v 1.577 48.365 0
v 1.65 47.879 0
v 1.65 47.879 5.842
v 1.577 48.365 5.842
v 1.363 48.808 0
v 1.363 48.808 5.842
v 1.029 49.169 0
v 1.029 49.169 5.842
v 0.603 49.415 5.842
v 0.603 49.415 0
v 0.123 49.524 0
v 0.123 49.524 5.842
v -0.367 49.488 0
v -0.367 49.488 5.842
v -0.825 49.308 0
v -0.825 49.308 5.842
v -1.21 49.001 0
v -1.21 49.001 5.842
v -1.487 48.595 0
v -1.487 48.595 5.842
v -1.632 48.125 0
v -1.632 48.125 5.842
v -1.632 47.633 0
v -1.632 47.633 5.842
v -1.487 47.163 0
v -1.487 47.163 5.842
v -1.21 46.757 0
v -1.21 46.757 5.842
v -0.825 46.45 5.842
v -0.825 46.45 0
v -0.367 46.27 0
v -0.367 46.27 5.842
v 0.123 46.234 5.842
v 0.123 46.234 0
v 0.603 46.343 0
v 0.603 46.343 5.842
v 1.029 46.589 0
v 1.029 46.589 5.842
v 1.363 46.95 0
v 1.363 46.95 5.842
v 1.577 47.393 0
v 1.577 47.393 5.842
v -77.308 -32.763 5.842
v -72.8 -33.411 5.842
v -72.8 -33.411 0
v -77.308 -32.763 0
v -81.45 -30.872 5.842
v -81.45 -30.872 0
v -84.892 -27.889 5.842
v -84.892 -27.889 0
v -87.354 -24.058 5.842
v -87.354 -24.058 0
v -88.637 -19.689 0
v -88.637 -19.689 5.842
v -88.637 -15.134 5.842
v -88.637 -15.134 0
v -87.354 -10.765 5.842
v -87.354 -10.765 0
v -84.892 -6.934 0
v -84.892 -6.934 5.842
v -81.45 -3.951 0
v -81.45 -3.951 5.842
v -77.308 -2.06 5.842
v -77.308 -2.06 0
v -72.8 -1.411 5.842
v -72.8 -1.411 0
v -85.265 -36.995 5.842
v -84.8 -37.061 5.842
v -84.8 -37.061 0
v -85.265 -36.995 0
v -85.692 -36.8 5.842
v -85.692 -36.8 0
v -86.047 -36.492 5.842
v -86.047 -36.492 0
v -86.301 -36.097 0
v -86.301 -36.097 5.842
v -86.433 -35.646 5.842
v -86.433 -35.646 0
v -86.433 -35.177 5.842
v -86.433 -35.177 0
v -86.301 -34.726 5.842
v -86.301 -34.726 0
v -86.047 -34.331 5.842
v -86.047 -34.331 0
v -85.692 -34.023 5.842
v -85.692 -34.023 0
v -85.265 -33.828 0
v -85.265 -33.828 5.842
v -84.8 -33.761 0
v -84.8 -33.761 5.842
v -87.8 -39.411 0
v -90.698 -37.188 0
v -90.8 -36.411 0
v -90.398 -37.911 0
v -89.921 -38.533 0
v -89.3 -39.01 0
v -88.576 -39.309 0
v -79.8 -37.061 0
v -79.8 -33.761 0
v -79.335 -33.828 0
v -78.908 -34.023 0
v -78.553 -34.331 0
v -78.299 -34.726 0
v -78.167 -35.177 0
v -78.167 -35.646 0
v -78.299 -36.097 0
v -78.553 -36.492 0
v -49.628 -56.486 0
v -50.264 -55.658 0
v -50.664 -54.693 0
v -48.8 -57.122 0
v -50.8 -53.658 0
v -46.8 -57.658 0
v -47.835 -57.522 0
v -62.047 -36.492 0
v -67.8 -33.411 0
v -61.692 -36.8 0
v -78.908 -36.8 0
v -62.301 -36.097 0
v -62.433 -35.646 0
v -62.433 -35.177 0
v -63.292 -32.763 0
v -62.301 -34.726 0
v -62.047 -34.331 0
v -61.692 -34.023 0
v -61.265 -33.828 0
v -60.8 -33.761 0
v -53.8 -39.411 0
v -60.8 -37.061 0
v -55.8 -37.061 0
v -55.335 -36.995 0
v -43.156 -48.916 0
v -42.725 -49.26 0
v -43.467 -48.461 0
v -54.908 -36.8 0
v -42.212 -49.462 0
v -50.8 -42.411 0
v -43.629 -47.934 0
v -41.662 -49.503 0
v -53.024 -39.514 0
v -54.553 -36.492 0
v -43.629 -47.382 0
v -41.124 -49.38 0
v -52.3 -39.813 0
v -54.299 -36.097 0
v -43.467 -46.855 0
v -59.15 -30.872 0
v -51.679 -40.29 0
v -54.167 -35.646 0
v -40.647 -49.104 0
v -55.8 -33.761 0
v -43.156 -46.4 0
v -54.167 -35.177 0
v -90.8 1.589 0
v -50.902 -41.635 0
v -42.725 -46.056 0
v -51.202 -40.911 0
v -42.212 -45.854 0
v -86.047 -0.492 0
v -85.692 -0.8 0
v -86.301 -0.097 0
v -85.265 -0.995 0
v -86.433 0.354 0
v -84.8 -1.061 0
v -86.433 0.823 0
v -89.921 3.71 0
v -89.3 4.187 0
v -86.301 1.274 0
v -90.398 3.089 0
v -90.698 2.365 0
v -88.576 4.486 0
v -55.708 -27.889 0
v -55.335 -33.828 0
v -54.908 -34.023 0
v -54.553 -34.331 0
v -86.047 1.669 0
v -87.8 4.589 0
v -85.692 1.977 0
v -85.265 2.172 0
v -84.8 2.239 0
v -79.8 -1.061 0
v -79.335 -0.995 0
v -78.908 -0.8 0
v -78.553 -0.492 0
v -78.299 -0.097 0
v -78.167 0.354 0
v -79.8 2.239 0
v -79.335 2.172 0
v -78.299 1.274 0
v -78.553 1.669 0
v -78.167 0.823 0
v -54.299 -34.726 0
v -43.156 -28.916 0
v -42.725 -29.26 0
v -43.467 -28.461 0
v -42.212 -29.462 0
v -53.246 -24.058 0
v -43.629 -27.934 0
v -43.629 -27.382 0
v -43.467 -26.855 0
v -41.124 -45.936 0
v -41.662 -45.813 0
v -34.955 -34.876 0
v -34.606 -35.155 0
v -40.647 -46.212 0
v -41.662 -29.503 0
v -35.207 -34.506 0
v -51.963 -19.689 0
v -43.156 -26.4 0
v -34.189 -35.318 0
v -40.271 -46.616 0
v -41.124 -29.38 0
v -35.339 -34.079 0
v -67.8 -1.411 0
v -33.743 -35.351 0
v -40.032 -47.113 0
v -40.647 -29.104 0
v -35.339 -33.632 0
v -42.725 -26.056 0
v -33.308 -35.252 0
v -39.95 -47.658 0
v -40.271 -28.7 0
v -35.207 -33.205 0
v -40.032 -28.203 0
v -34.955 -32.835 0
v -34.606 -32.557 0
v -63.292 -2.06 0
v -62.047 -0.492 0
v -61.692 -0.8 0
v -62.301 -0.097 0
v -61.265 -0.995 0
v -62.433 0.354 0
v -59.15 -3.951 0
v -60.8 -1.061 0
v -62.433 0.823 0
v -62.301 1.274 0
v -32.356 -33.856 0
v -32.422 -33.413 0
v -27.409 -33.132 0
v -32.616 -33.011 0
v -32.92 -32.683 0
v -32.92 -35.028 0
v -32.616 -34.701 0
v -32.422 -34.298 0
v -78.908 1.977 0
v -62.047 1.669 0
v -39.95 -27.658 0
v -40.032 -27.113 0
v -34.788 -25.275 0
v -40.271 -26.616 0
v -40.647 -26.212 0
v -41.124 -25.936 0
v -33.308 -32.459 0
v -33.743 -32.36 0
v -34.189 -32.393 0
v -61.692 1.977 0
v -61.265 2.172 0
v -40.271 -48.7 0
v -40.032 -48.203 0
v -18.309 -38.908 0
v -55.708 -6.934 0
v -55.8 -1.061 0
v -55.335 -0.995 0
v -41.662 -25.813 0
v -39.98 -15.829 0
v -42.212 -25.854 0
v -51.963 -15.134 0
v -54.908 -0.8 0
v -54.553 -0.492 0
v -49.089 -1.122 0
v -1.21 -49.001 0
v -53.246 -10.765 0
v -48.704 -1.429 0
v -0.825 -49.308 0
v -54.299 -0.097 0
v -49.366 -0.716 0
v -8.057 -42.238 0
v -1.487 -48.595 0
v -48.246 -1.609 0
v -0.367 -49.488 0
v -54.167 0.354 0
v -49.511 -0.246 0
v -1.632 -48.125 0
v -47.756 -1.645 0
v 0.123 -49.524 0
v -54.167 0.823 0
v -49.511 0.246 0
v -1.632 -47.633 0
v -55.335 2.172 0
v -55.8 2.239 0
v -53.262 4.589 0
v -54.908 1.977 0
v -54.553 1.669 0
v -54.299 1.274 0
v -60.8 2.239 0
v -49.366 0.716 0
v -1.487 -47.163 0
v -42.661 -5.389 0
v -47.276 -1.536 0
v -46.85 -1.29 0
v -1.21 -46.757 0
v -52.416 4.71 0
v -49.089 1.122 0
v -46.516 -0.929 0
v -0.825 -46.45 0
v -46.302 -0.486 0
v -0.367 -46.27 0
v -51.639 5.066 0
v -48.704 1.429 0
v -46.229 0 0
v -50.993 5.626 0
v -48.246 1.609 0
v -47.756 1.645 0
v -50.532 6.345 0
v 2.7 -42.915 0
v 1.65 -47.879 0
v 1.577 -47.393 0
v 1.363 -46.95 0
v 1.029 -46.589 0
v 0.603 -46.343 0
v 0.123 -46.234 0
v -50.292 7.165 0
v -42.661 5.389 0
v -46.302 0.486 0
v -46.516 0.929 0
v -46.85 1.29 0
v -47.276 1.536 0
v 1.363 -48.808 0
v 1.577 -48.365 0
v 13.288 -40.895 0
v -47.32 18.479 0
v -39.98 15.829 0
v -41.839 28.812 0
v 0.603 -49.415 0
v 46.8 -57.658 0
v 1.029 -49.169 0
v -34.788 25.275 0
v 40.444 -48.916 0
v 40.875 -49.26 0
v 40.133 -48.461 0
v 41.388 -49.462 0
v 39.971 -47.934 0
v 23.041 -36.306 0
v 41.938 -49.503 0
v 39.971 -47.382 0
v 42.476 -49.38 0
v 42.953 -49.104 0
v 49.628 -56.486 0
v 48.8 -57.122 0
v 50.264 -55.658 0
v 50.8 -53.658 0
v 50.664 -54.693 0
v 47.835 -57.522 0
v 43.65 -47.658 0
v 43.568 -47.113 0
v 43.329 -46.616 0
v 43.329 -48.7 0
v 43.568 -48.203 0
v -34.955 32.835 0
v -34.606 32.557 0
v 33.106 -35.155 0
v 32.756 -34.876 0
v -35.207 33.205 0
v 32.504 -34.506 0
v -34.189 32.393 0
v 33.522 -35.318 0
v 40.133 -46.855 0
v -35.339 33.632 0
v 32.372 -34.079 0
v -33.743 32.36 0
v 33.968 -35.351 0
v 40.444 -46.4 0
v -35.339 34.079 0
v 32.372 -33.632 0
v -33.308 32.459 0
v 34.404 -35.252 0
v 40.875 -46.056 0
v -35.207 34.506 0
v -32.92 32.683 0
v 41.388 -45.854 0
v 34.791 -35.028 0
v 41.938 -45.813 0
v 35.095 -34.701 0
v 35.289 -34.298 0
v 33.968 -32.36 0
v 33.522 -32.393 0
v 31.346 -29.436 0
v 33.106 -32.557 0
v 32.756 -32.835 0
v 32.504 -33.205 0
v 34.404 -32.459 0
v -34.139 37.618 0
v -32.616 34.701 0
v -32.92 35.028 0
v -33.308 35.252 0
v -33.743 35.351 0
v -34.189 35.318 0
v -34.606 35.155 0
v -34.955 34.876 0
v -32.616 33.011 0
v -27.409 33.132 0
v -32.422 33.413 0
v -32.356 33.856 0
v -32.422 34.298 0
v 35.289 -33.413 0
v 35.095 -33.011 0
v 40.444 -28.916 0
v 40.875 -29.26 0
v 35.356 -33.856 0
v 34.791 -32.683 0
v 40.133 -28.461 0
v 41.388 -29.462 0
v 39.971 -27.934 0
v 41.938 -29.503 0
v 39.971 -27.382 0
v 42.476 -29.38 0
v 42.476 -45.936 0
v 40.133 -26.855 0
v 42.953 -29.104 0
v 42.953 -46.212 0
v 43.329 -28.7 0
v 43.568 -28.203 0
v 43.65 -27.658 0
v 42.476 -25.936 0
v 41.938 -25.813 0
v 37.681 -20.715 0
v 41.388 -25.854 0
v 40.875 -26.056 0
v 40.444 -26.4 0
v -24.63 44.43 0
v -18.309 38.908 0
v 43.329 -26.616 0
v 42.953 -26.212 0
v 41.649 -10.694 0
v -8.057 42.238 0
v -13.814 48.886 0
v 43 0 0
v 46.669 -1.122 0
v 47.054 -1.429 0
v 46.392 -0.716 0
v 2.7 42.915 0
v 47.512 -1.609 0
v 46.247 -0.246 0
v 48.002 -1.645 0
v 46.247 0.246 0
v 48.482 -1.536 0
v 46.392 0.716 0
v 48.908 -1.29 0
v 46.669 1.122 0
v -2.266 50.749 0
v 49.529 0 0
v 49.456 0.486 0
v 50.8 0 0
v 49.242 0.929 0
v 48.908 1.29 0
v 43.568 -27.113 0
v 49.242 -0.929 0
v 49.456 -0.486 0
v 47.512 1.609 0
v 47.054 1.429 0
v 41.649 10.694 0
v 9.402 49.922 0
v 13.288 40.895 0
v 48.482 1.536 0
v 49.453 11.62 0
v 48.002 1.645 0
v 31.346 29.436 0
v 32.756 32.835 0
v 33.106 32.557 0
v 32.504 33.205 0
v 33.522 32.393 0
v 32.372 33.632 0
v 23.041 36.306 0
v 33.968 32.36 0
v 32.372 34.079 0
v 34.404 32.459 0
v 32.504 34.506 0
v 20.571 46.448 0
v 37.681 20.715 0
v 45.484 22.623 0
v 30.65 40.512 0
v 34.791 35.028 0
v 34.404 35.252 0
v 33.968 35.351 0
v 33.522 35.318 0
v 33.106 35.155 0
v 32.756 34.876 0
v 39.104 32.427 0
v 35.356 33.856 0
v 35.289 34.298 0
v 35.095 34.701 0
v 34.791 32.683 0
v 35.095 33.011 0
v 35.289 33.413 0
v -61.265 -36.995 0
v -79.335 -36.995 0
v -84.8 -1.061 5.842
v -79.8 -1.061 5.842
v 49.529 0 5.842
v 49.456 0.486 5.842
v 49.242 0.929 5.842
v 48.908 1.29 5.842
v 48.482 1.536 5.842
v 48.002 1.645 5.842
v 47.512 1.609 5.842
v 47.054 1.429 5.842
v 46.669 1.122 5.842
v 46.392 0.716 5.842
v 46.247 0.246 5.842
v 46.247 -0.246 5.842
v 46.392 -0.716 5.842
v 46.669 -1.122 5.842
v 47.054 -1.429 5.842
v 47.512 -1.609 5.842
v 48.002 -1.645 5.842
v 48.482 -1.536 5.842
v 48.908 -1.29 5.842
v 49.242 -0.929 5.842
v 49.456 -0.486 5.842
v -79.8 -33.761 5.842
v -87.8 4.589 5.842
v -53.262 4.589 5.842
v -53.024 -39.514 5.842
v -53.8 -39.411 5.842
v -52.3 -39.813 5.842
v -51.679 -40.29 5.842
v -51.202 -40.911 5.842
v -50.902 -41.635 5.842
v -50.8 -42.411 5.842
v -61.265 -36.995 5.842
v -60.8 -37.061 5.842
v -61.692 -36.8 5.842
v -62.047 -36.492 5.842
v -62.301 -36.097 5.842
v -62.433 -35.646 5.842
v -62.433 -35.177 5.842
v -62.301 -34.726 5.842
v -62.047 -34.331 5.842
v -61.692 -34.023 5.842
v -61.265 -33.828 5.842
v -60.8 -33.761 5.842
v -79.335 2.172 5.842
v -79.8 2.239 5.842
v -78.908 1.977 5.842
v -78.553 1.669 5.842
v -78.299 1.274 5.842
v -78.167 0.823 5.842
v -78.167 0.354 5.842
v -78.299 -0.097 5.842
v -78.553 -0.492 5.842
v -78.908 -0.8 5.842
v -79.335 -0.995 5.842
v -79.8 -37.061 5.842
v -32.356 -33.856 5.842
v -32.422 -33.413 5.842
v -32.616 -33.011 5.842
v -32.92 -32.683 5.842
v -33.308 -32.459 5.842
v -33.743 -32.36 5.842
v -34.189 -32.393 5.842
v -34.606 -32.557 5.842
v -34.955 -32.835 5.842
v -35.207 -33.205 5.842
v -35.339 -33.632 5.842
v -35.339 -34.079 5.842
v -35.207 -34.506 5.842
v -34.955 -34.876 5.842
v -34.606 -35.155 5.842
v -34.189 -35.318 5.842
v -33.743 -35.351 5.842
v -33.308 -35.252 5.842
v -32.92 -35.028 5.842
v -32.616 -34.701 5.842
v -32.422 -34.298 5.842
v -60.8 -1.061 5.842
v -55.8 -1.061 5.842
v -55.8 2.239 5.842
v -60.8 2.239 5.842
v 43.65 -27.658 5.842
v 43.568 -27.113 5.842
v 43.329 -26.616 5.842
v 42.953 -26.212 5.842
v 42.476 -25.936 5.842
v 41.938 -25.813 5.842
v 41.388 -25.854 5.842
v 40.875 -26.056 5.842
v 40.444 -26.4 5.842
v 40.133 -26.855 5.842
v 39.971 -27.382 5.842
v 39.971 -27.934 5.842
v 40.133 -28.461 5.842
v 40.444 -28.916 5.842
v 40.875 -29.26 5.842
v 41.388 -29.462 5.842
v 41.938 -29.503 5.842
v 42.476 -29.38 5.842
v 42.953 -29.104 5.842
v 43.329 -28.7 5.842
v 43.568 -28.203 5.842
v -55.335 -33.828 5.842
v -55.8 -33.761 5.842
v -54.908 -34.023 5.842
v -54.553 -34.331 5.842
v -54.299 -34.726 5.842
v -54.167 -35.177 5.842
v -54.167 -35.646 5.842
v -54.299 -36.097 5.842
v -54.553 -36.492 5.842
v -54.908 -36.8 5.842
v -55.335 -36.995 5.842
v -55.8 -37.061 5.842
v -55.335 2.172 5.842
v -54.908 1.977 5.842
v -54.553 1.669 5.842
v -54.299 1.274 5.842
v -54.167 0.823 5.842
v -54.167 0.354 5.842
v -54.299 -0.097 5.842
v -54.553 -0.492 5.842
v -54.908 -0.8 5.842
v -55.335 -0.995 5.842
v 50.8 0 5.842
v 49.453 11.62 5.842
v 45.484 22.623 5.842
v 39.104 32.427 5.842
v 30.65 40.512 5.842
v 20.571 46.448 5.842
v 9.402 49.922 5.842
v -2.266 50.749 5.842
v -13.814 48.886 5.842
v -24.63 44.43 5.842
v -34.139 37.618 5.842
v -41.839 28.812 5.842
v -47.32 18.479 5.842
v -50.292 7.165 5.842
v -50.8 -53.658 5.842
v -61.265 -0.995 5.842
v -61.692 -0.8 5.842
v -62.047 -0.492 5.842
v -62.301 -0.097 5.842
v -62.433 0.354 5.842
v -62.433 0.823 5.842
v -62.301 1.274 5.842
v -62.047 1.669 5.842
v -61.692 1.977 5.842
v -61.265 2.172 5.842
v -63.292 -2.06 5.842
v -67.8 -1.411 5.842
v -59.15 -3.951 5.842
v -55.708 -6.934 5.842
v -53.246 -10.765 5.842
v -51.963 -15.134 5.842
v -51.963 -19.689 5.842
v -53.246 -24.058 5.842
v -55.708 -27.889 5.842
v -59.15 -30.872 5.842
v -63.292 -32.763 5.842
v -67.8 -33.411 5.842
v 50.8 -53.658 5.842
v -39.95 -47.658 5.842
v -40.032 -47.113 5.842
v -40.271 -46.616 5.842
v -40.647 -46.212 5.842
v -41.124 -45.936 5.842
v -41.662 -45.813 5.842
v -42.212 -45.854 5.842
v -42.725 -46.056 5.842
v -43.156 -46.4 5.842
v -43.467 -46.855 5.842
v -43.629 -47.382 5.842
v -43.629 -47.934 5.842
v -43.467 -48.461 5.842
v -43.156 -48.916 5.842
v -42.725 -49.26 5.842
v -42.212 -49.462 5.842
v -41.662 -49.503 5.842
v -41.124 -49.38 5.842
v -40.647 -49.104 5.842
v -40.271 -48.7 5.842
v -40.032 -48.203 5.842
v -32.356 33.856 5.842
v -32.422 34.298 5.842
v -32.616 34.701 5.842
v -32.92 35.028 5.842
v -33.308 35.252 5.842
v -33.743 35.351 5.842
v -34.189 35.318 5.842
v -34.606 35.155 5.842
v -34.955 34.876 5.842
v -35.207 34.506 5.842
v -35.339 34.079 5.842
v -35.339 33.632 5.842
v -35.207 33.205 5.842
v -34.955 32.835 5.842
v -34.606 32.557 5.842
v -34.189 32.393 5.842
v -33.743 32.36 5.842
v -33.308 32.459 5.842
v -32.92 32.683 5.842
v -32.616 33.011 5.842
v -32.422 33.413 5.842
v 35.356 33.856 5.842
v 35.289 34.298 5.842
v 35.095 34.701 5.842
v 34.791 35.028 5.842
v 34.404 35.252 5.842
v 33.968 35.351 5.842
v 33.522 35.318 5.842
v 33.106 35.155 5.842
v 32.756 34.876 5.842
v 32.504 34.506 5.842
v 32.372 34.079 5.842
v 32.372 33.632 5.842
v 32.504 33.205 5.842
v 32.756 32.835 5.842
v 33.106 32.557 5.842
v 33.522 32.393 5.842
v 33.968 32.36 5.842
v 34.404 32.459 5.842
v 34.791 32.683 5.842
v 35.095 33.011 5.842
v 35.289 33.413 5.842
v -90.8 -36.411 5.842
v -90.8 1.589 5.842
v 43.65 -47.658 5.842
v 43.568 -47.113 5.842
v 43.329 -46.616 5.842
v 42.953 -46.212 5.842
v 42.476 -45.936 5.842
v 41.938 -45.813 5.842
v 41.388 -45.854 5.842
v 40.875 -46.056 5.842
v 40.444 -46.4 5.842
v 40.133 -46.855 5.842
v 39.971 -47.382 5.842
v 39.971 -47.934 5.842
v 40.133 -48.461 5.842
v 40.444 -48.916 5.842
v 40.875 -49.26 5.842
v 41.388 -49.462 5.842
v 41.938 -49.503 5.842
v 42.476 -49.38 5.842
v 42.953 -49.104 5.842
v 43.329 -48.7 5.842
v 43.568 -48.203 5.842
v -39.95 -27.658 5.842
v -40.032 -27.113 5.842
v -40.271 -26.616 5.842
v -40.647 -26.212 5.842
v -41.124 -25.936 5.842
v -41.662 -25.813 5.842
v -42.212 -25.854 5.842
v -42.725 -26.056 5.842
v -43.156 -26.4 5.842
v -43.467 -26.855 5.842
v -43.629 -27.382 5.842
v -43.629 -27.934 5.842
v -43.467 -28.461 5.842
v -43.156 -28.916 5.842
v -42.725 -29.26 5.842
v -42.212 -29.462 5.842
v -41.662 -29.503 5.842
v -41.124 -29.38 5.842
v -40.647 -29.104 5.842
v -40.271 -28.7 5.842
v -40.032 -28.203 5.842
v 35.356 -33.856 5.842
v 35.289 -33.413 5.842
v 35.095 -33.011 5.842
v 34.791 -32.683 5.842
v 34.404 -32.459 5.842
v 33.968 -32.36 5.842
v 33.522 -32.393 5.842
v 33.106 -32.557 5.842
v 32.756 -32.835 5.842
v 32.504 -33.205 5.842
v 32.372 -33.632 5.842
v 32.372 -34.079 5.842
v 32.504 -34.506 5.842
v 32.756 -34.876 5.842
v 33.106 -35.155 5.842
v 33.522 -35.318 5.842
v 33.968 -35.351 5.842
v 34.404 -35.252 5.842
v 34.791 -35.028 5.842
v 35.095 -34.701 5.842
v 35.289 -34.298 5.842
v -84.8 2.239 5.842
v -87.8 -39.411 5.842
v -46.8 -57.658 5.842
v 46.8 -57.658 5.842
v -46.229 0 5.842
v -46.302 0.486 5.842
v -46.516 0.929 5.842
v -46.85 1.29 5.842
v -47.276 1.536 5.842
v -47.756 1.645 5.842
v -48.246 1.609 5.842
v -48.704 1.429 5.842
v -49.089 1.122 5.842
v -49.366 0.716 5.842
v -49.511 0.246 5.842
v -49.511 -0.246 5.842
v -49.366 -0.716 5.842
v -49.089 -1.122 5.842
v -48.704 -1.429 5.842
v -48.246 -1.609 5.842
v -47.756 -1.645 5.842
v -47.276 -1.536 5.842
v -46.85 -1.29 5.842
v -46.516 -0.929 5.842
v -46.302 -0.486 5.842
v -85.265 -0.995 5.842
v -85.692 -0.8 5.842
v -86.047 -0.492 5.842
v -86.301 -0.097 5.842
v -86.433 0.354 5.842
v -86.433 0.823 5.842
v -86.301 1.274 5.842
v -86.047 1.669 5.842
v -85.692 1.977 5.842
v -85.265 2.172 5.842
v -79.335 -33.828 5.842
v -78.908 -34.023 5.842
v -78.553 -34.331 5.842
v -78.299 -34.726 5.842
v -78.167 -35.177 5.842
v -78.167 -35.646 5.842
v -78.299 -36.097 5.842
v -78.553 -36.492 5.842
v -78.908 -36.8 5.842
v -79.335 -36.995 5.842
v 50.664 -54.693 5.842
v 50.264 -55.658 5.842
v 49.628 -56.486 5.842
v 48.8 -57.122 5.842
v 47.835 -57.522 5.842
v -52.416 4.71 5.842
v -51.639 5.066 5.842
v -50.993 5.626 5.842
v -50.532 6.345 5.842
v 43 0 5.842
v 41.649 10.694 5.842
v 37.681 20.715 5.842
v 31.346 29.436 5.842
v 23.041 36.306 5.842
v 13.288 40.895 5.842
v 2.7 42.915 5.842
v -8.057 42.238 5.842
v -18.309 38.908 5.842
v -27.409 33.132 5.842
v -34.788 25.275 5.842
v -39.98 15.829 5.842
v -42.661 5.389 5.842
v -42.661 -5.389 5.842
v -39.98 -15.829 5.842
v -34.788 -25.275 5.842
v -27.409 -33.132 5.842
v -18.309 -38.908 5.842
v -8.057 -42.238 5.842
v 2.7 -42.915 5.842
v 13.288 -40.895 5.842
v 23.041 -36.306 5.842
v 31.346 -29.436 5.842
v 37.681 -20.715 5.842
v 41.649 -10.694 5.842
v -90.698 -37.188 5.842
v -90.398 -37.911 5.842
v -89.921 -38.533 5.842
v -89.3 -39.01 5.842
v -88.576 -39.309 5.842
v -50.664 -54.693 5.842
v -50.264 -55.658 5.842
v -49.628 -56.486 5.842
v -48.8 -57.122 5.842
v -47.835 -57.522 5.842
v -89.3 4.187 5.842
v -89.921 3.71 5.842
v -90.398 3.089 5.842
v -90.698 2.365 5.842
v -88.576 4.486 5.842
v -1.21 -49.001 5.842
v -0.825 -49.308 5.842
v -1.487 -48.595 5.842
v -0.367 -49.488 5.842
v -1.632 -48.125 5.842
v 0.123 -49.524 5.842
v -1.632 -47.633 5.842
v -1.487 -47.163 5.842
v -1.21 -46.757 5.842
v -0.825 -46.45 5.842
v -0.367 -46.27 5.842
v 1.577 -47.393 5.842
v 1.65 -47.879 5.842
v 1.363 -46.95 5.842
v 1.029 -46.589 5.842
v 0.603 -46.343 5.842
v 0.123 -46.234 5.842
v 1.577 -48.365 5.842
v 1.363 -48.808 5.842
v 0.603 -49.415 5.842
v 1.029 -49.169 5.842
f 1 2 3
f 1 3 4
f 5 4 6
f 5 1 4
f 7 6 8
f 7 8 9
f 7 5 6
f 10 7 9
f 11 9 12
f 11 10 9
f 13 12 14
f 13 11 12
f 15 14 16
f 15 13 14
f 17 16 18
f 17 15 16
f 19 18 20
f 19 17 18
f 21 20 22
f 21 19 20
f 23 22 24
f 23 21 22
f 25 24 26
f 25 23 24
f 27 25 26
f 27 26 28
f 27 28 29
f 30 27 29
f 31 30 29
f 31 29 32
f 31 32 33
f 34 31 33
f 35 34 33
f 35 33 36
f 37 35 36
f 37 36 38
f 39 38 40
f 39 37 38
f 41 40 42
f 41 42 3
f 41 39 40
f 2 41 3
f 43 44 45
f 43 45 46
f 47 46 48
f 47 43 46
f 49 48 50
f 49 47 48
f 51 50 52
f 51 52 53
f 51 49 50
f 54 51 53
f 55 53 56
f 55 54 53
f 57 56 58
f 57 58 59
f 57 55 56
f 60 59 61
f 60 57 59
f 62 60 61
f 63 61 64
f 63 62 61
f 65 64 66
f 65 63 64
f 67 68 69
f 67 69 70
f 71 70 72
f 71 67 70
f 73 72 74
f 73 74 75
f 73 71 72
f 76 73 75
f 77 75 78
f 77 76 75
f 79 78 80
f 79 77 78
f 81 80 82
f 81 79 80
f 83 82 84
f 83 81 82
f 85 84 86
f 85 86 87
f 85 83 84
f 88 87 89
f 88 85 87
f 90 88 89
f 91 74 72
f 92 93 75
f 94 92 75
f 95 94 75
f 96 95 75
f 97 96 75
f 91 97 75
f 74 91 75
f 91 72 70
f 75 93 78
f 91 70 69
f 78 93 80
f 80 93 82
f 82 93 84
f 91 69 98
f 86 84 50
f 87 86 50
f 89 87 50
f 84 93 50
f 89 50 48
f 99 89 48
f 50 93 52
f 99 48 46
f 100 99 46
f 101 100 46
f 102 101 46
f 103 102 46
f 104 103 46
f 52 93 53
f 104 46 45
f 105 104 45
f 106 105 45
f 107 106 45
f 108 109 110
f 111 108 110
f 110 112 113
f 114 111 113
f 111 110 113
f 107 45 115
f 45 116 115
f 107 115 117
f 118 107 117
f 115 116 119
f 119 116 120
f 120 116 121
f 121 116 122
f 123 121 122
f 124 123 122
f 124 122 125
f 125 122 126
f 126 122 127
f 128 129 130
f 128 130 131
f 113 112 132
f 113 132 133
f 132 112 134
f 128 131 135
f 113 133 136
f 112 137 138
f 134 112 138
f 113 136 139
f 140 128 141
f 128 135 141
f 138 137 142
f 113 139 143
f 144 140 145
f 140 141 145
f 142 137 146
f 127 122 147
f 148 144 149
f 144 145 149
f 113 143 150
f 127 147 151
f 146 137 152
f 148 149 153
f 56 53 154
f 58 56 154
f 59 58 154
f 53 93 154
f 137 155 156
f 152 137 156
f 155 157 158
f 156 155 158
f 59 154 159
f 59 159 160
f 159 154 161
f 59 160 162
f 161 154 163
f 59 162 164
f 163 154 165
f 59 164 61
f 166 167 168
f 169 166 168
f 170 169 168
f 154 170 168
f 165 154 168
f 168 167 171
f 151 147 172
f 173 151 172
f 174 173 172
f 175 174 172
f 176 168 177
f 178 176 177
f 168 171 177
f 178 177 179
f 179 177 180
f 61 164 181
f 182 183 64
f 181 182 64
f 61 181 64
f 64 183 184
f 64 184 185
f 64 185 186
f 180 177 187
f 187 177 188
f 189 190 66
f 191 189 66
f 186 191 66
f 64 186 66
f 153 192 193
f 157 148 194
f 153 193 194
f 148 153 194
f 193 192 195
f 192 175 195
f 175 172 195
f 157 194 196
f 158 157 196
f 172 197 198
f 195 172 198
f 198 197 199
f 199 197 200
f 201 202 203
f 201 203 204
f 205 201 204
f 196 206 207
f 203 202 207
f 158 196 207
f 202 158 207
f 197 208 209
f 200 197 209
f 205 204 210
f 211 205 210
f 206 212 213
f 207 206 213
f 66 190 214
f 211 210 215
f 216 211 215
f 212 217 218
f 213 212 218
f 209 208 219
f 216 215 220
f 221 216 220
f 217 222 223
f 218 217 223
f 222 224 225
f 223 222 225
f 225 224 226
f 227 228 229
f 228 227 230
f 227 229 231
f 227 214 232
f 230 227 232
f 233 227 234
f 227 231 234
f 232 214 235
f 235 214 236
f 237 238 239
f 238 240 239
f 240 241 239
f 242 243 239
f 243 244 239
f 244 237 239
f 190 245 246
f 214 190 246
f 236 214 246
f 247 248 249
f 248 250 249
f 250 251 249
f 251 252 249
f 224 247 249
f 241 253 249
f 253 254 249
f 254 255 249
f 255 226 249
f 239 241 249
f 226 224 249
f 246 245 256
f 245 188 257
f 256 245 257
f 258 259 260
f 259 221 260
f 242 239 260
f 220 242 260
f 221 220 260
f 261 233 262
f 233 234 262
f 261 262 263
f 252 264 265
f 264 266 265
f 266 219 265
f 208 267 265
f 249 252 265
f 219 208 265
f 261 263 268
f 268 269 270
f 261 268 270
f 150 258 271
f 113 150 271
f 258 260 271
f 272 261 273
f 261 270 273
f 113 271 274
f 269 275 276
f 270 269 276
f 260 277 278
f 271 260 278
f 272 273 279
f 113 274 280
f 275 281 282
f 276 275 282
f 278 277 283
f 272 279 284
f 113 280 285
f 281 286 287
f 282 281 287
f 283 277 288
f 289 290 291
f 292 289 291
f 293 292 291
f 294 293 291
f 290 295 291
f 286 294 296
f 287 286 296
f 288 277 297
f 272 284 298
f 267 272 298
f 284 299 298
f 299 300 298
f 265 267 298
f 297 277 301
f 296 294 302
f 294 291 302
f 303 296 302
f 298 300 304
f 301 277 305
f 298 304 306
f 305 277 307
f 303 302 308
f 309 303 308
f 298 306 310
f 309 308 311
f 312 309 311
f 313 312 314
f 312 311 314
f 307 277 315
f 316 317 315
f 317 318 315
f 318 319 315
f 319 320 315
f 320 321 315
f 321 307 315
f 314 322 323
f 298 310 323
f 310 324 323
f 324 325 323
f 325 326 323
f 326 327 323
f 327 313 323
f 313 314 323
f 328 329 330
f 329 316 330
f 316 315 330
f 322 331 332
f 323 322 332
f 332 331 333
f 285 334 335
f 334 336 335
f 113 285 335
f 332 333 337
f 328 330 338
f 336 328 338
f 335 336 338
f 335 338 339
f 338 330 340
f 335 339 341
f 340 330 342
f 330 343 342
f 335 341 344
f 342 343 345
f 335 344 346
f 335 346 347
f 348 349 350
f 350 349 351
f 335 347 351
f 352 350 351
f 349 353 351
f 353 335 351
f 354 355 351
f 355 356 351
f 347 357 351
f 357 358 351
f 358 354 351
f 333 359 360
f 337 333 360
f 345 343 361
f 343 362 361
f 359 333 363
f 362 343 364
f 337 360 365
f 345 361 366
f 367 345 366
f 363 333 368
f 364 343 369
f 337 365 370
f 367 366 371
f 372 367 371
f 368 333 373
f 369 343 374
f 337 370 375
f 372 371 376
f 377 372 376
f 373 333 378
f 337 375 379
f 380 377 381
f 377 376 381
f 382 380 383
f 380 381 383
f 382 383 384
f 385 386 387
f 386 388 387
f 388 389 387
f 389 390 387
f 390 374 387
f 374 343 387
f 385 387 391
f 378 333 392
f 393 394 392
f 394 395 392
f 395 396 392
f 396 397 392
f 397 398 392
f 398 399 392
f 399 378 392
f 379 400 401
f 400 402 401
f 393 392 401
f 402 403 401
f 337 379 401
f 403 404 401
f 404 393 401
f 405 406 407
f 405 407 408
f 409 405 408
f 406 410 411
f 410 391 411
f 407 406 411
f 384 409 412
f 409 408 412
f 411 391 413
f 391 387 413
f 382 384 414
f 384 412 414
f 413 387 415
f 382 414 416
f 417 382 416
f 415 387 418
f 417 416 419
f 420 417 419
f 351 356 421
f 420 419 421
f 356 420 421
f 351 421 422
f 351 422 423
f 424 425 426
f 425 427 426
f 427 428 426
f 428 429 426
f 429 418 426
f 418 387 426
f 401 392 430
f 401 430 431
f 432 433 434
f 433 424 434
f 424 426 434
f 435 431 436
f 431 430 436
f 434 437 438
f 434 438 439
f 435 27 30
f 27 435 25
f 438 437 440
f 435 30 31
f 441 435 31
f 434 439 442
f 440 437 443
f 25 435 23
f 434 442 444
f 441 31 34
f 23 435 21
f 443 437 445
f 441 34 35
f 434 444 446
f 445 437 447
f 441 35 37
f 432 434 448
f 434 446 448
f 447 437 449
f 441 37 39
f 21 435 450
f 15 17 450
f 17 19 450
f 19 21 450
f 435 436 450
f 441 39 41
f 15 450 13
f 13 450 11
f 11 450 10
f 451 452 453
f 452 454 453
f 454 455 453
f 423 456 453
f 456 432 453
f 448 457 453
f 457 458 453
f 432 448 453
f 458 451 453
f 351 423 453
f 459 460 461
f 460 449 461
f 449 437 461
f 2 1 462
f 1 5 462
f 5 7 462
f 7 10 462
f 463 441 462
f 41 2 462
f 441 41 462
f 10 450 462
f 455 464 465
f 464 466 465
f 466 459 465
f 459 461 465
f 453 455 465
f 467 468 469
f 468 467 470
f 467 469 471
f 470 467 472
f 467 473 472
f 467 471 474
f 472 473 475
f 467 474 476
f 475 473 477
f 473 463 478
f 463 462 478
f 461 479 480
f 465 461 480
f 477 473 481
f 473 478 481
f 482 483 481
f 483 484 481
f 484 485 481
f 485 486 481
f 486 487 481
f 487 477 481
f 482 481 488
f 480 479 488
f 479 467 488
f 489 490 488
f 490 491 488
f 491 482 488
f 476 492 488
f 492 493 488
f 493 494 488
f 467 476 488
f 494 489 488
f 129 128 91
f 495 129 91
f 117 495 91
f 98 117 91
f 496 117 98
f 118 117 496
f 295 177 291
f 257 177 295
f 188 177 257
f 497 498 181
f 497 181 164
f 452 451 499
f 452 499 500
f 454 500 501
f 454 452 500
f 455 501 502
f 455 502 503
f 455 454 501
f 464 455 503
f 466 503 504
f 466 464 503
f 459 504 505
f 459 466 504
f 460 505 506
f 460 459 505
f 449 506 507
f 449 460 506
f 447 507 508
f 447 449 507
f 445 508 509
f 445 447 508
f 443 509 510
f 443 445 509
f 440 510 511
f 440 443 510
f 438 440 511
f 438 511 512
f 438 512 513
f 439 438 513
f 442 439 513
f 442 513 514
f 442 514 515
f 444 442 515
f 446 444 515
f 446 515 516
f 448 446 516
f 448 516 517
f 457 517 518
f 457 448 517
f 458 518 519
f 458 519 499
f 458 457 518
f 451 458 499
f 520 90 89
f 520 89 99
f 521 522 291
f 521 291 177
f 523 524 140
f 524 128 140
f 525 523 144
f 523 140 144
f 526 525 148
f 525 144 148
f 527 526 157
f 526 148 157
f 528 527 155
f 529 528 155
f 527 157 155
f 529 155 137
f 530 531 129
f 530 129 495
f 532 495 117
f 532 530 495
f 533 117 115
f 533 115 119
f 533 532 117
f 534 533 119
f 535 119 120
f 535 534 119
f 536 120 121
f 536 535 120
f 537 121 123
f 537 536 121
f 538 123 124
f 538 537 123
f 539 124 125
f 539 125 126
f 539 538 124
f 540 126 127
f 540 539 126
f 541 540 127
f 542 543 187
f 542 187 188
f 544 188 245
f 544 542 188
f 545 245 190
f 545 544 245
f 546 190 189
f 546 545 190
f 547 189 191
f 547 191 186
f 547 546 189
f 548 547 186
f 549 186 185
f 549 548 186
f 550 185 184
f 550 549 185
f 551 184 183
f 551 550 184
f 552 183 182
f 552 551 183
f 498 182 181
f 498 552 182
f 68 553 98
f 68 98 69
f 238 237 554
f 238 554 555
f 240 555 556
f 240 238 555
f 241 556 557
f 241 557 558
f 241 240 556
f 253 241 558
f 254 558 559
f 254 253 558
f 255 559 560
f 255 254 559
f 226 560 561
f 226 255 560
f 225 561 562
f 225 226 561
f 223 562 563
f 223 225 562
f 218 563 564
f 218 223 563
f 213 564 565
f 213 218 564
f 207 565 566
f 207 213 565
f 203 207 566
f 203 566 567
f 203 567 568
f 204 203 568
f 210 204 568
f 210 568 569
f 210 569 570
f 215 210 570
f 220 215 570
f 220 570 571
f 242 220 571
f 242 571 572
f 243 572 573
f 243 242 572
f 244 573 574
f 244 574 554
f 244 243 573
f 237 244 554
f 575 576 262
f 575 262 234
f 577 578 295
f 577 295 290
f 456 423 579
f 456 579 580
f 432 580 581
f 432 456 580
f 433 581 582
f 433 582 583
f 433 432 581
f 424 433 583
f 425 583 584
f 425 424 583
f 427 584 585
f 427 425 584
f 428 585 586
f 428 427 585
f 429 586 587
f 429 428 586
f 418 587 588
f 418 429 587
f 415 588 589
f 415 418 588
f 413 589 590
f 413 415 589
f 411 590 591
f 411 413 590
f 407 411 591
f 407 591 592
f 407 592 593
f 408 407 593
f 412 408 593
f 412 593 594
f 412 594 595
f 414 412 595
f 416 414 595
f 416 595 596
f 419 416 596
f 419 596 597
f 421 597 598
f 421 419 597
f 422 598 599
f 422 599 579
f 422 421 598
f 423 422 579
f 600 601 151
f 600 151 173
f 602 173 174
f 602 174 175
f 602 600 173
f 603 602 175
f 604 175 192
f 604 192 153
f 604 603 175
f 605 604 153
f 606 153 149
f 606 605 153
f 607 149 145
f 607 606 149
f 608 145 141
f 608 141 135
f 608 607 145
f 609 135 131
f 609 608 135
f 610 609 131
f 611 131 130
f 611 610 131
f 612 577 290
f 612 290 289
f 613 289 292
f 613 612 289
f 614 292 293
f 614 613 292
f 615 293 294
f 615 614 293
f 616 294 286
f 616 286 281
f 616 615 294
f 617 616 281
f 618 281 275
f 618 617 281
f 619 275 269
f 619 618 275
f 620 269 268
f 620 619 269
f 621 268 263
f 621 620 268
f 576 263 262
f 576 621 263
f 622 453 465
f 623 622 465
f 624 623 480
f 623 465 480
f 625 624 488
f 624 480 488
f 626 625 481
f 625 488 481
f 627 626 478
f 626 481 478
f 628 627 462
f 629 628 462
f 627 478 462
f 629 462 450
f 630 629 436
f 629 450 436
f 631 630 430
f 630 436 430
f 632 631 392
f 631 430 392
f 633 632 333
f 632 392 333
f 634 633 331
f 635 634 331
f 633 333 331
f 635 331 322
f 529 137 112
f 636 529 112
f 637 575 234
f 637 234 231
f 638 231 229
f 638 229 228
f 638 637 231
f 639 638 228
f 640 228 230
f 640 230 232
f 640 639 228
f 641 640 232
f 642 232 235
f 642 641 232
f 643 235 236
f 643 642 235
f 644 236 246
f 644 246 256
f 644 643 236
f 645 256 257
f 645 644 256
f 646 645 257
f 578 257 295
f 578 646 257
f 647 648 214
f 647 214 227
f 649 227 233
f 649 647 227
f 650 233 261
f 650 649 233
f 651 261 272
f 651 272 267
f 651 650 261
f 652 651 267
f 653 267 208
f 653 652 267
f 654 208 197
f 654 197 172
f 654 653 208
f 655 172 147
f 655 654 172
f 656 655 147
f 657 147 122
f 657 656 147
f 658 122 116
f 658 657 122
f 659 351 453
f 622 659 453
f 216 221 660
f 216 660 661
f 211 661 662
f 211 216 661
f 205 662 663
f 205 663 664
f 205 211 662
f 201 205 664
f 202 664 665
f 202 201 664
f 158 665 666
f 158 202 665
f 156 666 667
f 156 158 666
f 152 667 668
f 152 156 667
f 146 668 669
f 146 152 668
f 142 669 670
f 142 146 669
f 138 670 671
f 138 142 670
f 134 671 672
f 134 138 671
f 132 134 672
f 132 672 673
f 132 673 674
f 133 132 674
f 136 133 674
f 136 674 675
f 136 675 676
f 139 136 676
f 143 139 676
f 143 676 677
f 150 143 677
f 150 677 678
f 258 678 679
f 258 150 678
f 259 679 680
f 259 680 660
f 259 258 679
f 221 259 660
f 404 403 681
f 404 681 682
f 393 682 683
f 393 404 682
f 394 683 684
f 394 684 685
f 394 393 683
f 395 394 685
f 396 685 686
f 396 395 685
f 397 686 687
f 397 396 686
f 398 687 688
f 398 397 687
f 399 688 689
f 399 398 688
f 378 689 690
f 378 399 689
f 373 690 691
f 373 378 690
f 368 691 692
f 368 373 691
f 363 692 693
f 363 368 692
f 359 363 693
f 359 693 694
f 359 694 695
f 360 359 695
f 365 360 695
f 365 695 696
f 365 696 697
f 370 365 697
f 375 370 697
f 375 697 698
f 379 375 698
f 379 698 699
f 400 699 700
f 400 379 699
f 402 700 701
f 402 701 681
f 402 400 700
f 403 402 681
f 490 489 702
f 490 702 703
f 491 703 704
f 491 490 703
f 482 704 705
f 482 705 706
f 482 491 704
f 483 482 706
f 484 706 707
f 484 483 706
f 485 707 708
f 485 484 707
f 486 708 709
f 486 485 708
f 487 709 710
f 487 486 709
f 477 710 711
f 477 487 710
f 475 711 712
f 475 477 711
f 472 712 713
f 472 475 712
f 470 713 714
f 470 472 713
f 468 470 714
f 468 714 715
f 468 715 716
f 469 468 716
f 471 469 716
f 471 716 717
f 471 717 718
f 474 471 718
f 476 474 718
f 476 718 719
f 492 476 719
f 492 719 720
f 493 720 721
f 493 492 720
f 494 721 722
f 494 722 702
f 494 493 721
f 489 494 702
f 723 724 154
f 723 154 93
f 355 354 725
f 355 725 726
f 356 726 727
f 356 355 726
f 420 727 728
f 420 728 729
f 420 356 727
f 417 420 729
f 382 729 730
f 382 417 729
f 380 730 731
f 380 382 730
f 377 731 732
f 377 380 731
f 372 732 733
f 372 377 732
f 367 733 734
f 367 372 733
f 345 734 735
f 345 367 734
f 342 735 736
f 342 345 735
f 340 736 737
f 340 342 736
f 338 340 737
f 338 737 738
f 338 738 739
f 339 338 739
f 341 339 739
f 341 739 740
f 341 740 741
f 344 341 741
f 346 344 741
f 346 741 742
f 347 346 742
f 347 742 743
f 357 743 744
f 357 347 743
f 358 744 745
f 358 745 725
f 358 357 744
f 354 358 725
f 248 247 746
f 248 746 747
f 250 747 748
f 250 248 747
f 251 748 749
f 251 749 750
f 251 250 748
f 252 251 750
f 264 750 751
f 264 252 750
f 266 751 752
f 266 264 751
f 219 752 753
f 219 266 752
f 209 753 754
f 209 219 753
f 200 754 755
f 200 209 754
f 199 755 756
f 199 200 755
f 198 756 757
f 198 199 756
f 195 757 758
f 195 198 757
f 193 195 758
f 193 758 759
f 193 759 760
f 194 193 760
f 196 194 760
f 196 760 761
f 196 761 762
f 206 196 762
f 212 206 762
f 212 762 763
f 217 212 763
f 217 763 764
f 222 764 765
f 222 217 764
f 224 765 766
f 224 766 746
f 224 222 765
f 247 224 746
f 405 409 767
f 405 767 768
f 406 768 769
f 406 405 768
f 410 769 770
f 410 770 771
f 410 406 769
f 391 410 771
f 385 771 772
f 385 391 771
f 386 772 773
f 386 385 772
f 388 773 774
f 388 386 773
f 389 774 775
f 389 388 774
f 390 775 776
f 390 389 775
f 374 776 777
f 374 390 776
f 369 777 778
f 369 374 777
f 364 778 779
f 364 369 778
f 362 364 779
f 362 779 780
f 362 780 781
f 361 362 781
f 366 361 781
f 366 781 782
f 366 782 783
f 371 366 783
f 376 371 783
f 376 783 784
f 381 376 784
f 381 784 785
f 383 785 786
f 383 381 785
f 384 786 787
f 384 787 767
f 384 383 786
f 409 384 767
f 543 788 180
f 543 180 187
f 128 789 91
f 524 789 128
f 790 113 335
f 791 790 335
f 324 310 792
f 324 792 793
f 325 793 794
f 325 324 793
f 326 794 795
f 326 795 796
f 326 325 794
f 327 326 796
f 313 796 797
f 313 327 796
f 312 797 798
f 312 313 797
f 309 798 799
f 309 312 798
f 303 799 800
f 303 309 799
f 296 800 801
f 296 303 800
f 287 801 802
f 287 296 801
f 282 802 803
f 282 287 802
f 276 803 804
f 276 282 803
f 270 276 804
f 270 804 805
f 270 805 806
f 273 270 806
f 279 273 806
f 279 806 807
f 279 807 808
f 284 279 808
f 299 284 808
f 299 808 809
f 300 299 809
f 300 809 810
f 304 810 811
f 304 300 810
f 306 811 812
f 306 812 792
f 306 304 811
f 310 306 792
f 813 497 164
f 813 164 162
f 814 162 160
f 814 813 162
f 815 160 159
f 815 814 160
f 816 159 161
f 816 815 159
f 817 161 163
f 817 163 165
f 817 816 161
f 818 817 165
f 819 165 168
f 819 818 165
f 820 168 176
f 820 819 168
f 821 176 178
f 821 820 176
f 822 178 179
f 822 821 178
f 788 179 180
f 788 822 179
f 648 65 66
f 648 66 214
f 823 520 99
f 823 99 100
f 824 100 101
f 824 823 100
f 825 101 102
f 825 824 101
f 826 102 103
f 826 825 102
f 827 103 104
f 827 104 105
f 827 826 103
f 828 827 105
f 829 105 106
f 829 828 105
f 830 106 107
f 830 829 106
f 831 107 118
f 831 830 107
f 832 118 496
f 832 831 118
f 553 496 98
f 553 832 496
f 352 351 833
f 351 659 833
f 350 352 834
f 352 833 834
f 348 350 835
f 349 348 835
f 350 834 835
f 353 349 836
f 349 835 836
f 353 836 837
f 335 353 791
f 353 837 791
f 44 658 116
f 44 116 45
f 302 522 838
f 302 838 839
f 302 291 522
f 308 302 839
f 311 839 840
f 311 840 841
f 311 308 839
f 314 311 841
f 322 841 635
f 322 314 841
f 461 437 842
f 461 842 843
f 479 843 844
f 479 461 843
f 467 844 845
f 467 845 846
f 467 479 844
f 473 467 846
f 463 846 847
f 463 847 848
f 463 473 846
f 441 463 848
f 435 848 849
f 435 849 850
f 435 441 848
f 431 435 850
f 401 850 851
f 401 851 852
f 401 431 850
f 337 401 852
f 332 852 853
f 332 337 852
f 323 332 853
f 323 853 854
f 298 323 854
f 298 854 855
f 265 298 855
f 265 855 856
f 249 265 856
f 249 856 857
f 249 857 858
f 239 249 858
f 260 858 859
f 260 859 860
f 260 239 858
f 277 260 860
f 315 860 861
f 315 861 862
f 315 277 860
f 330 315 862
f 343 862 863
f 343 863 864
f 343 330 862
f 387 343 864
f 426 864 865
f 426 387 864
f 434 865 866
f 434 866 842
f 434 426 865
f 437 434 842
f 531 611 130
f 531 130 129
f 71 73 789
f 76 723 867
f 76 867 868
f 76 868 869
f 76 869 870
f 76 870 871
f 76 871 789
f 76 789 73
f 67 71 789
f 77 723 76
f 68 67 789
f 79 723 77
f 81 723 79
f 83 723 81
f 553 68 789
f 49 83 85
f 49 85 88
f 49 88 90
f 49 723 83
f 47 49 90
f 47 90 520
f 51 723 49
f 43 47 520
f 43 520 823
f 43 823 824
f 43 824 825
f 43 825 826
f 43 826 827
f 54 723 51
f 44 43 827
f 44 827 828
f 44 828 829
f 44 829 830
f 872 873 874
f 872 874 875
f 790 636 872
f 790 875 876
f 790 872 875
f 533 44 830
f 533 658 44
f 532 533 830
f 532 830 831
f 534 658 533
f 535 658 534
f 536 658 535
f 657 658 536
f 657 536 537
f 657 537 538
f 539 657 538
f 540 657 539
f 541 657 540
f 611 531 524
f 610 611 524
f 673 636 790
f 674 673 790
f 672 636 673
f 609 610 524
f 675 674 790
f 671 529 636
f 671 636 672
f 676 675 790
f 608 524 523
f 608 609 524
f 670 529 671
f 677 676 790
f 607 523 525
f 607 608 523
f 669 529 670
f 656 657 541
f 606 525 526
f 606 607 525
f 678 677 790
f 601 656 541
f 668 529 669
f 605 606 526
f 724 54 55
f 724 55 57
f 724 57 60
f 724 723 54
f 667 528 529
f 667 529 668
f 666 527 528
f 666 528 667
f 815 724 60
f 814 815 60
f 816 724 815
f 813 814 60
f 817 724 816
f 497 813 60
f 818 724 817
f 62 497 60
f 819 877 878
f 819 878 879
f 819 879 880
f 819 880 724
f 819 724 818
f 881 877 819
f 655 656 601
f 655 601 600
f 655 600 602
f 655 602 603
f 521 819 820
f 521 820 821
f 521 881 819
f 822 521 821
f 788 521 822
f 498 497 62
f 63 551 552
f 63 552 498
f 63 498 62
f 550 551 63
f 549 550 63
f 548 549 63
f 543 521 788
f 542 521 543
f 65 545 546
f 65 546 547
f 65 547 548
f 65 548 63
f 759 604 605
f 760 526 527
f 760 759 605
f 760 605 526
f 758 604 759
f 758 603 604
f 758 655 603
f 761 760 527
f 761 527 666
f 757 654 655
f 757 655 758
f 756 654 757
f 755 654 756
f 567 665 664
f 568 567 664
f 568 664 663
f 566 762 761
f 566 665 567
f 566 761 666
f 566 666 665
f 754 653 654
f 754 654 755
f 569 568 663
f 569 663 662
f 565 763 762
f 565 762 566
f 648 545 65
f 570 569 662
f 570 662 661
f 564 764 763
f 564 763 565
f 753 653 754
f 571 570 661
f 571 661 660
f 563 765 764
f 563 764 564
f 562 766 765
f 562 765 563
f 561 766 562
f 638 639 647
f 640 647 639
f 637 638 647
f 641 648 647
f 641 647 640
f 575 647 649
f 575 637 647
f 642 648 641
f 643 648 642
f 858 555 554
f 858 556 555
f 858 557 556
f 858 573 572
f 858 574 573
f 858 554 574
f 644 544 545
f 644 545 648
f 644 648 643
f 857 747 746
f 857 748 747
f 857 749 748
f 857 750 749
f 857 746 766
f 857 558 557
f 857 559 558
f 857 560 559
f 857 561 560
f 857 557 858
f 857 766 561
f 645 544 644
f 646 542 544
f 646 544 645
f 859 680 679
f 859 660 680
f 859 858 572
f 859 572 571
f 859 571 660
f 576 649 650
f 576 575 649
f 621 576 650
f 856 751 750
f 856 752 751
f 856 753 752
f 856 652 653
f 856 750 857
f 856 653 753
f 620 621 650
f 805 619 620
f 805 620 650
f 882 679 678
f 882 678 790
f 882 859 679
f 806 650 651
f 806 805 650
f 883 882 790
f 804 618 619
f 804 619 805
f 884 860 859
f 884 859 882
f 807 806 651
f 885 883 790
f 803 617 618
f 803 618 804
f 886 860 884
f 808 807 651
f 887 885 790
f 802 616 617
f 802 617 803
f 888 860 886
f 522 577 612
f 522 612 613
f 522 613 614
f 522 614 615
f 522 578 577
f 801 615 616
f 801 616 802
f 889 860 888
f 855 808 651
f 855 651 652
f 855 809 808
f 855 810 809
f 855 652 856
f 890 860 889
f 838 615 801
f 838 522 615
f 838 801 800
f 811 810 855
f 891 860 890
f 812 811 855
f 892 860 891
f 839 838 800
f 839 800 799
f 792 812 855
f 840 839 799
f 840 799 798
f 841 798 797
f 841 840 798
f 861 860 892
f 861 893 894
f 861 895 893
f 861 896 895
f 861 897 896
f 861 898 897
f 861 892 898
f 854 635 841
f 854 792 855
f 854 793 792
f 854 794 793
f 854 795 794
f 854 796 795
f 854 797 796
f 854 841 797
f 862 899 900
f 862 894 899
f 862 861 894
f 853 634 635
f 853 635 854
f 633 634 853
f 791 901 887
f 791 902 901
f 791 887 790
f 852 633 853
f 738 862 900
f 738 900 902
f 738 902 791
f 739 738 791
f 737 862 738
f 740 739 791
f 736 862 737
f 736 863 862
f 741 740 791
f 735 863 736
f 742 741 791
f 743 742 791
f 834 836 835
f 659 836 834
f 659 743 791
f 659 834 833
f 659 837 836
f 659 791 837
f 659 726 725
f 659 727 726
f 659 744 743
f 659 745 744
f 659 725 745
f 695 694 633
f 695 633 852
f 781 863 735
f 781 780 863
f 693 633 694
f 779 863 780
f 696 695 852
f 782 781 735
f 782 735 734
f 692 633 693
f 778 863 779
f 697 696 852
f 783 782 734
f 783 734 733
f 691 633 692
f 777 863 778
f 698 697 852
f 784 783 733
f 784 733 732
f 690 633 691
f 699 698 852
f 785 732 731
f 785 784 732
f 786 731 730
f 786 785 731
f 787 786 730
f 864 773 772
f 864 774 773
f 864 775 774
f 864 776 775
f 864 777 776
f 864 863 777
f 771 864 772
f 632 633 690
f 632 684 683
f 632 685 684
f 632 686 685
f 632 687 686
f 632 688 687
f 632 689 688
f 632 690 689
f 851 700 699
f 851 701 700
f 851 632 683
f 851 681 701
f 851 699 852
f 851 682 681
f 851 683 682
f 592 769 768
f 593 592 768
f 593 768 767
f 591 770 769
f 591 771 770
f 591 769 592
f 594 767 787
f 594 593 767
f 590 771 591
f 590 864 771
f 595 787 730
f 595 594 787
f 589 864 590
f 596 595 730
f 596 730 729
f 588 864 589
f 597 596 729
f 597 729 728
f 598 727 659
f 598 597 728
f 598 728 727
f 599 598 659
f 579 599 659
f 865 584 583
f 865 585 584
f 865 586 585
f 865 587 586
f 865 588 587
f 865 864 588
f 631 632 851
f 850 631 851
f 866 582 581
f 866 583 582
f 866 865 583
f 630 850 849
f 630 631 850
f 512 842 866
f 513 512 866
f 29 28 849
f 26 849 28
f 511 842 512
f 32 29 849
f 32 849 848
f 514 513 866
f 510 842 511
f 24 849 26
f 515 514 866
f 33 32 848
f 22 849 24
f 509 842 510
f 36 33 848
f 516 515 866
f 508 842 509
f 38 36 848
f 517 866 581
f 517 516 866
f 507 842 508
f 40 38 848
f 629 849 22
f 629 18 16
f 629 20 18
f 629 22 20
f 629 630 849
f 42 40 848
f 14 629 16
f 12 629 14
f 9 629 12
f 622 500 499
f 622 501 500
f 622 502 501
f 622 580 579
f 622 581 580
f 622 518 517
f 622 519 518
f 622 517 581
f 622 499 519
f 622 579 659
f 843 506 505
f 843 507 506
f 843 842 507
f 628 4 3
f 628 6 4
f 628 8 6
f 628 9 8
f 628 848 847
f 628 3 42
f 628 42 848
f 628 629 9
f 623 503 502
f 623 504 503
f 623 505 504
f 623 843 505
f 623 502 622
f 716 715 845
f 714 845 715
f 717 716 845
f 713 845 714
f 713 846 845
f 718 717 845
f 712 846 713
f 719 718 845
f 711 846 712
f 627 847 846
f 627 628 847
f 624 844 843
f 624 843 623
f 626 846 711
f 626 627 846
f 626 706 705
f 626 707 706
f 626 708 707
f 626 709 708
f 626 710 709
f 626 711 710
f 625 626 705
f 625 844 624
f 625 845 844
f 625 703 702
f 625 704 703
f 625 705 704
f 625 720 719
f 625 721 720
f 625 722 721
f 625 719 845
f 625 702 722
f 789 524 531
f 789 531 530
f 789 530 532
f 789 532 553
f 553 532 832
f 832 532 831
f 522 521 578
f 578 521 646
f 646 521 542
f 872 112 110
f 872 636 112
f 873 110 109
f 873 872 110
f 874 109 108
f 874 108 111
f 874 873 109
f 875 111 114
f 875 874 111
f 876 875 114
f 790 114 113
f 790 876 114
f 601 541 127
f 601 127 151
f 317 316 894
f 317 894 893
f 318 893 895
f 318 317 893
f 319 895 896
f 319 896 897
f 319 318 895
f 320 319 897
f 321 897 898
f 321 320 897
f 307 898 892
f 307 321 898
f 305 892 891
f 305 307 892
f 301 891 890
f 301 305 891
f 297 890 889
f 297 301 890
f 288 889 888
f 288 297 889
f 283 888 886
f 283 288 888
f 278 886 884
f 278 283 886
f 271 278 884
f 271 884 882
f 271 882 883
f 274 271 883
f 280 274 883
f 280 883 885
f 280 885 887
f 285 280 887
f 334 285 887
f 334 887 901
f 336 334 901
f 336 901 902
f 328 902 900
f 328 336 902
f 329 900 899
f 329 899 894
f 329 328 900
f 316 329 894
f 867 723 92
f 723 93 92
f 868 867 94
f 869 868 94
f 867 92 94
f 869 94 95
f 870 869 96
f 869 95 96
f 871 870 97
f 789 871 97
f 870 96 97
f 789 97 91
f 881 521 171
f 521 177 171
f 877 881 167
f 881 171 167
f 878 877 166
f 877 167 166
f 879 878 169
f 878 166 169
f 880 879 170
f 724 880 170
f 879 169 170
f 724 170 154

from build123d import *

# Parameters (mm, degrees)
SKETCH1_R           = 1.85
SKETCH1_R_2         = 1.5
SKETCH1_R_3         = 1.65
SKETCH1_R_4         = 43
BOSS_EXTRUDE1_DEPTH = 5.842
FILLET1_R           = 4
BOSS_EXTRUDE2_DEPTH = 5.842
FILLET2_R           = 3


with BuildPart() as part:
    # Sketch1 → Boss-Extrude1 (new body)
    # profile 1 of 2: a face of its own
    with BuildSketch(Plane.XY):
        with BuildLine():
            ThreePointArc((50.8, 0), (0, 50.8), (-50.8, 0))
            Line((-50.8, 0), (-50.8, -57.658))
            Line((-50.8, -57.658), (0, -57.658))
            Line((0, -57.658), (50.8, -57.658))
            Line((50.8, -57.658), (50.8, 0))
        make_face()
        with Locations((-41.8, -47.658)):
            Circle(SKETCH1_R, mode=Mode.SUBTRACT)
        with Locations((-33.855565576, -33.855565576)):
            Circle(SKETCH1_R_2, mode=Mode.SUBTRACT)
        with Locations((-41.8, -27.658)):
            Circle(SKETCH1_R, mode=Mode.SUBTRACT)
        with Locations((0, -47.879)):
            Circle(SKETCH1_R_3, mode=Mode.SUBTRACT)
        with Locations((41.8, -47.658)):
            Circle(SKETCH1_R, mode=Mode.SUBTRACT)
        with Locations((33.855565576, -33.855565576)):
            Circle(SKETCH1_R_2, mode=Mode.SUBTRACT)
        with Locations((41.8, -27.658)):
            Circle(SKETCH1_R, mode=Mode.SUBTRACT)
        with Locations((-47.879, 0)):
            Circle(SKETCH1_R_3, mode=Mode.SUBTRACT)
        Circle(SKETCH1_R_4, mode=Mode.SUBTRACT)
        with Locations((-33.855565576, 33.855565576)):
            Circle(SKETCH1_R_2, mode=Mode.SUBTRACT)
        with Locations((0, 47.879)):
            Circle(SKETCH1_R_3, mode=Mode.SUBTRACT)
        with Locations((47.879, 0)):
            Circle(SKETCH1_R_3, mode=Mode.SUBTRACT)
        with Locations((33.855565576, 33.855565576)):
            Circle(SKETCH1_R_2, mode=Mode.SUBTRACT)
    # profile 2 of 2: a face of its own
    with BuildSketch(Plane.XY):
        with BuildLine():
            ThreePointArc((50.8, 0), (0, 50.8), (-50.8, 0))
            Line((-50.8, 0), (-50.8, -57.658))
            Line((-50.8, -57.658), (0, -57.658))
            Line((0, -57.658), (50.8, -57.658))
            Line((50.8, -57.658), (50.8, 0))
        make_face()
        with Locations((-41.8, -47.658)):
            Circle(SKETCH1_R, mode=Mode.SUBTRACT)
        with Locations((-33.855565576, -33.855565576)):
            Circle(SKETCH1_R_2, mode=Mode.SUBTRACT)
        with Locations((-41.8, -27.658)):
            Circle(SKETCH1_R, mode=Mode.SUBTRACT)
        with Locations((0, -47.879)):
            Circle(SKETCH1_R_3, mode=Mode.SUBTRACT)
        with Locations((41.8, -47.658)):
            Circle(SKETCH1_R, mode=Mode.SUBTRACT)
        with Locations((33.855565576, -33.855565576)):
            Circle(SKETCH1_R_2, mode=Mode.SUBTRACT)
        with Locations((41.8, -27.658)):
            Circle(SKETCH1_R, mode=Mode.SUBTRACT)
        with Locations((-47.879, 0)):
            Circle(SKETCH1_R_3, mode=Mode.SUBTRACT)
        Circle(SKETCH1_R_4, mode=Mode.SUBTRACT)
        with Locations((-33.855565576, 33.855565576)):
            Circle(SKETCH1_R_2, mode=Mode.SUBTRACT)
        with Locations((0, 47.879)):
            Circle(SKETCH1_R_3, mode=Mode.SUBTRACT)
        with Locations((47.879, 0)):
            Circle(SKETCH1_R_3, mode=Mode.SUBTRACT)
        with Locations((33.855565576, 33.855565576)):
            Circle(SKETCH1_R_2, mode=Mode.SUBTRACT)
    extrude(amount=BOSS_EXTRUDE1_DEPTH)

    # Fillet1
    fillet1_edges = [part.edges().sort_by_distance(p)[0] for p in [
        (50.8, -57.658, 2.921),
        (-50.8, -57.658, 2.921),
    ]]
    fillet(fillet1_edges, radius=FILLET1_R)

    # Sketch2 → Boss-Extrude2 (add, through all)
    with BuildSketch(Plane.XY.offset(5.842)):
        Polygon((-50.592347052, 4.588509541), (-90.8, 4.588509541), (-90.8, -39.411490459), (-50.8, -39.411490459), align=None)
        with BuildLine():
            Line((-67.8, -33.411490459), (-72.8, -33.411490459))
            ThreePointArc((-72.8, -33.411490459), (-88.8, -17.411490459), (-72.8, -1.411490459))
            Line((-72.8, -1.411490459), (-67.8, -1.411490459))
            ThreePointArc((-67.8, -1.411490459), (-51.8, -17.411490459), (-67.8, -33.411490459))
        make_face(mode=Mode.SUBTRACT)
        with BuildLine():
            Line((-79.8, -1.061490459), (-84.8, -1.061490459))
            ThreePointArc((-84.8, -1.061490459), (-86.45, 0.588509541), (-84.8, 2.238509541))
            Line((-84.8, 2.238509541), (-79.8, 2.238509541))
            ThreePointArc((-79.8, 2.238509541), (-78.15, 0.588509541), (-79.8, -1.061490459))
        make_face(mode=Mode.SUBTRACT)
        with BuildLine():
            Line((-55.8, -1.061490459), (-60.8, -1.061490459))
            ThreePointArc((-60.8, -1.061490459), (-62.45, 0.588509541), (-60.8, 2.238509541))
            Line((-60.8, 2.238509541), (-55.8, 2.238509541))
            ThreePointArc((-55.8, 2.238509541), (-54.15, 0.588509541), (-55.8, -1.061490459))
        make_face(mode=Mode.SUBTRACT)
        with BuildLine():
            Line((-55.8, -37.061490459), (-60.8, -37.061490459))
            ThreePointArc((-60.8, -37.061490459), (-62.45, -35.411490459), (-60.8, -33.761490459))
            Line((-60.8, -33.761490459), (-55.8, -33.761490459))
            ThreePointArc((-55.8, -33.761490459), (-54.15, -35.411490459), (-55.8, -37.061490459))
        make_face(mode=Mode.SUBTRACT)
        with BuildLine():
            Line((-79.8, -37.061490459), (-84.8, -37.061490459))
            ThreePointArc((-84.8, -37.061490459), (-86.45, -35.411490459), (-84.8, -33.761490459))
            Line((-84.8, -33.761490459), (-79.8, -33.761490459))
            ThreePointArc((-79.8, -33.761490459), (-78.15, -35.411490459), (-79.8, -37.061490459))
        make_face(mode=Mode.SUBTRACT)
    extrude(amount=-BOSS_EXTRUDE2_DEPTH)

    # Fillet2
    fillet2_edges = [part.edges().sort_by_distance(p)[0] for p in [
        (-50.592347052, 4.588509541, 2.921),
        (-50.8, -39.411490459, 2.921),
        (-90.8, -39.411490459, 2.921),
        (-90.8, 4.588509541, 2.921),
    ]]
    fillet(fillet2_edges, radius=FILLET2_R)


solid = part.part
